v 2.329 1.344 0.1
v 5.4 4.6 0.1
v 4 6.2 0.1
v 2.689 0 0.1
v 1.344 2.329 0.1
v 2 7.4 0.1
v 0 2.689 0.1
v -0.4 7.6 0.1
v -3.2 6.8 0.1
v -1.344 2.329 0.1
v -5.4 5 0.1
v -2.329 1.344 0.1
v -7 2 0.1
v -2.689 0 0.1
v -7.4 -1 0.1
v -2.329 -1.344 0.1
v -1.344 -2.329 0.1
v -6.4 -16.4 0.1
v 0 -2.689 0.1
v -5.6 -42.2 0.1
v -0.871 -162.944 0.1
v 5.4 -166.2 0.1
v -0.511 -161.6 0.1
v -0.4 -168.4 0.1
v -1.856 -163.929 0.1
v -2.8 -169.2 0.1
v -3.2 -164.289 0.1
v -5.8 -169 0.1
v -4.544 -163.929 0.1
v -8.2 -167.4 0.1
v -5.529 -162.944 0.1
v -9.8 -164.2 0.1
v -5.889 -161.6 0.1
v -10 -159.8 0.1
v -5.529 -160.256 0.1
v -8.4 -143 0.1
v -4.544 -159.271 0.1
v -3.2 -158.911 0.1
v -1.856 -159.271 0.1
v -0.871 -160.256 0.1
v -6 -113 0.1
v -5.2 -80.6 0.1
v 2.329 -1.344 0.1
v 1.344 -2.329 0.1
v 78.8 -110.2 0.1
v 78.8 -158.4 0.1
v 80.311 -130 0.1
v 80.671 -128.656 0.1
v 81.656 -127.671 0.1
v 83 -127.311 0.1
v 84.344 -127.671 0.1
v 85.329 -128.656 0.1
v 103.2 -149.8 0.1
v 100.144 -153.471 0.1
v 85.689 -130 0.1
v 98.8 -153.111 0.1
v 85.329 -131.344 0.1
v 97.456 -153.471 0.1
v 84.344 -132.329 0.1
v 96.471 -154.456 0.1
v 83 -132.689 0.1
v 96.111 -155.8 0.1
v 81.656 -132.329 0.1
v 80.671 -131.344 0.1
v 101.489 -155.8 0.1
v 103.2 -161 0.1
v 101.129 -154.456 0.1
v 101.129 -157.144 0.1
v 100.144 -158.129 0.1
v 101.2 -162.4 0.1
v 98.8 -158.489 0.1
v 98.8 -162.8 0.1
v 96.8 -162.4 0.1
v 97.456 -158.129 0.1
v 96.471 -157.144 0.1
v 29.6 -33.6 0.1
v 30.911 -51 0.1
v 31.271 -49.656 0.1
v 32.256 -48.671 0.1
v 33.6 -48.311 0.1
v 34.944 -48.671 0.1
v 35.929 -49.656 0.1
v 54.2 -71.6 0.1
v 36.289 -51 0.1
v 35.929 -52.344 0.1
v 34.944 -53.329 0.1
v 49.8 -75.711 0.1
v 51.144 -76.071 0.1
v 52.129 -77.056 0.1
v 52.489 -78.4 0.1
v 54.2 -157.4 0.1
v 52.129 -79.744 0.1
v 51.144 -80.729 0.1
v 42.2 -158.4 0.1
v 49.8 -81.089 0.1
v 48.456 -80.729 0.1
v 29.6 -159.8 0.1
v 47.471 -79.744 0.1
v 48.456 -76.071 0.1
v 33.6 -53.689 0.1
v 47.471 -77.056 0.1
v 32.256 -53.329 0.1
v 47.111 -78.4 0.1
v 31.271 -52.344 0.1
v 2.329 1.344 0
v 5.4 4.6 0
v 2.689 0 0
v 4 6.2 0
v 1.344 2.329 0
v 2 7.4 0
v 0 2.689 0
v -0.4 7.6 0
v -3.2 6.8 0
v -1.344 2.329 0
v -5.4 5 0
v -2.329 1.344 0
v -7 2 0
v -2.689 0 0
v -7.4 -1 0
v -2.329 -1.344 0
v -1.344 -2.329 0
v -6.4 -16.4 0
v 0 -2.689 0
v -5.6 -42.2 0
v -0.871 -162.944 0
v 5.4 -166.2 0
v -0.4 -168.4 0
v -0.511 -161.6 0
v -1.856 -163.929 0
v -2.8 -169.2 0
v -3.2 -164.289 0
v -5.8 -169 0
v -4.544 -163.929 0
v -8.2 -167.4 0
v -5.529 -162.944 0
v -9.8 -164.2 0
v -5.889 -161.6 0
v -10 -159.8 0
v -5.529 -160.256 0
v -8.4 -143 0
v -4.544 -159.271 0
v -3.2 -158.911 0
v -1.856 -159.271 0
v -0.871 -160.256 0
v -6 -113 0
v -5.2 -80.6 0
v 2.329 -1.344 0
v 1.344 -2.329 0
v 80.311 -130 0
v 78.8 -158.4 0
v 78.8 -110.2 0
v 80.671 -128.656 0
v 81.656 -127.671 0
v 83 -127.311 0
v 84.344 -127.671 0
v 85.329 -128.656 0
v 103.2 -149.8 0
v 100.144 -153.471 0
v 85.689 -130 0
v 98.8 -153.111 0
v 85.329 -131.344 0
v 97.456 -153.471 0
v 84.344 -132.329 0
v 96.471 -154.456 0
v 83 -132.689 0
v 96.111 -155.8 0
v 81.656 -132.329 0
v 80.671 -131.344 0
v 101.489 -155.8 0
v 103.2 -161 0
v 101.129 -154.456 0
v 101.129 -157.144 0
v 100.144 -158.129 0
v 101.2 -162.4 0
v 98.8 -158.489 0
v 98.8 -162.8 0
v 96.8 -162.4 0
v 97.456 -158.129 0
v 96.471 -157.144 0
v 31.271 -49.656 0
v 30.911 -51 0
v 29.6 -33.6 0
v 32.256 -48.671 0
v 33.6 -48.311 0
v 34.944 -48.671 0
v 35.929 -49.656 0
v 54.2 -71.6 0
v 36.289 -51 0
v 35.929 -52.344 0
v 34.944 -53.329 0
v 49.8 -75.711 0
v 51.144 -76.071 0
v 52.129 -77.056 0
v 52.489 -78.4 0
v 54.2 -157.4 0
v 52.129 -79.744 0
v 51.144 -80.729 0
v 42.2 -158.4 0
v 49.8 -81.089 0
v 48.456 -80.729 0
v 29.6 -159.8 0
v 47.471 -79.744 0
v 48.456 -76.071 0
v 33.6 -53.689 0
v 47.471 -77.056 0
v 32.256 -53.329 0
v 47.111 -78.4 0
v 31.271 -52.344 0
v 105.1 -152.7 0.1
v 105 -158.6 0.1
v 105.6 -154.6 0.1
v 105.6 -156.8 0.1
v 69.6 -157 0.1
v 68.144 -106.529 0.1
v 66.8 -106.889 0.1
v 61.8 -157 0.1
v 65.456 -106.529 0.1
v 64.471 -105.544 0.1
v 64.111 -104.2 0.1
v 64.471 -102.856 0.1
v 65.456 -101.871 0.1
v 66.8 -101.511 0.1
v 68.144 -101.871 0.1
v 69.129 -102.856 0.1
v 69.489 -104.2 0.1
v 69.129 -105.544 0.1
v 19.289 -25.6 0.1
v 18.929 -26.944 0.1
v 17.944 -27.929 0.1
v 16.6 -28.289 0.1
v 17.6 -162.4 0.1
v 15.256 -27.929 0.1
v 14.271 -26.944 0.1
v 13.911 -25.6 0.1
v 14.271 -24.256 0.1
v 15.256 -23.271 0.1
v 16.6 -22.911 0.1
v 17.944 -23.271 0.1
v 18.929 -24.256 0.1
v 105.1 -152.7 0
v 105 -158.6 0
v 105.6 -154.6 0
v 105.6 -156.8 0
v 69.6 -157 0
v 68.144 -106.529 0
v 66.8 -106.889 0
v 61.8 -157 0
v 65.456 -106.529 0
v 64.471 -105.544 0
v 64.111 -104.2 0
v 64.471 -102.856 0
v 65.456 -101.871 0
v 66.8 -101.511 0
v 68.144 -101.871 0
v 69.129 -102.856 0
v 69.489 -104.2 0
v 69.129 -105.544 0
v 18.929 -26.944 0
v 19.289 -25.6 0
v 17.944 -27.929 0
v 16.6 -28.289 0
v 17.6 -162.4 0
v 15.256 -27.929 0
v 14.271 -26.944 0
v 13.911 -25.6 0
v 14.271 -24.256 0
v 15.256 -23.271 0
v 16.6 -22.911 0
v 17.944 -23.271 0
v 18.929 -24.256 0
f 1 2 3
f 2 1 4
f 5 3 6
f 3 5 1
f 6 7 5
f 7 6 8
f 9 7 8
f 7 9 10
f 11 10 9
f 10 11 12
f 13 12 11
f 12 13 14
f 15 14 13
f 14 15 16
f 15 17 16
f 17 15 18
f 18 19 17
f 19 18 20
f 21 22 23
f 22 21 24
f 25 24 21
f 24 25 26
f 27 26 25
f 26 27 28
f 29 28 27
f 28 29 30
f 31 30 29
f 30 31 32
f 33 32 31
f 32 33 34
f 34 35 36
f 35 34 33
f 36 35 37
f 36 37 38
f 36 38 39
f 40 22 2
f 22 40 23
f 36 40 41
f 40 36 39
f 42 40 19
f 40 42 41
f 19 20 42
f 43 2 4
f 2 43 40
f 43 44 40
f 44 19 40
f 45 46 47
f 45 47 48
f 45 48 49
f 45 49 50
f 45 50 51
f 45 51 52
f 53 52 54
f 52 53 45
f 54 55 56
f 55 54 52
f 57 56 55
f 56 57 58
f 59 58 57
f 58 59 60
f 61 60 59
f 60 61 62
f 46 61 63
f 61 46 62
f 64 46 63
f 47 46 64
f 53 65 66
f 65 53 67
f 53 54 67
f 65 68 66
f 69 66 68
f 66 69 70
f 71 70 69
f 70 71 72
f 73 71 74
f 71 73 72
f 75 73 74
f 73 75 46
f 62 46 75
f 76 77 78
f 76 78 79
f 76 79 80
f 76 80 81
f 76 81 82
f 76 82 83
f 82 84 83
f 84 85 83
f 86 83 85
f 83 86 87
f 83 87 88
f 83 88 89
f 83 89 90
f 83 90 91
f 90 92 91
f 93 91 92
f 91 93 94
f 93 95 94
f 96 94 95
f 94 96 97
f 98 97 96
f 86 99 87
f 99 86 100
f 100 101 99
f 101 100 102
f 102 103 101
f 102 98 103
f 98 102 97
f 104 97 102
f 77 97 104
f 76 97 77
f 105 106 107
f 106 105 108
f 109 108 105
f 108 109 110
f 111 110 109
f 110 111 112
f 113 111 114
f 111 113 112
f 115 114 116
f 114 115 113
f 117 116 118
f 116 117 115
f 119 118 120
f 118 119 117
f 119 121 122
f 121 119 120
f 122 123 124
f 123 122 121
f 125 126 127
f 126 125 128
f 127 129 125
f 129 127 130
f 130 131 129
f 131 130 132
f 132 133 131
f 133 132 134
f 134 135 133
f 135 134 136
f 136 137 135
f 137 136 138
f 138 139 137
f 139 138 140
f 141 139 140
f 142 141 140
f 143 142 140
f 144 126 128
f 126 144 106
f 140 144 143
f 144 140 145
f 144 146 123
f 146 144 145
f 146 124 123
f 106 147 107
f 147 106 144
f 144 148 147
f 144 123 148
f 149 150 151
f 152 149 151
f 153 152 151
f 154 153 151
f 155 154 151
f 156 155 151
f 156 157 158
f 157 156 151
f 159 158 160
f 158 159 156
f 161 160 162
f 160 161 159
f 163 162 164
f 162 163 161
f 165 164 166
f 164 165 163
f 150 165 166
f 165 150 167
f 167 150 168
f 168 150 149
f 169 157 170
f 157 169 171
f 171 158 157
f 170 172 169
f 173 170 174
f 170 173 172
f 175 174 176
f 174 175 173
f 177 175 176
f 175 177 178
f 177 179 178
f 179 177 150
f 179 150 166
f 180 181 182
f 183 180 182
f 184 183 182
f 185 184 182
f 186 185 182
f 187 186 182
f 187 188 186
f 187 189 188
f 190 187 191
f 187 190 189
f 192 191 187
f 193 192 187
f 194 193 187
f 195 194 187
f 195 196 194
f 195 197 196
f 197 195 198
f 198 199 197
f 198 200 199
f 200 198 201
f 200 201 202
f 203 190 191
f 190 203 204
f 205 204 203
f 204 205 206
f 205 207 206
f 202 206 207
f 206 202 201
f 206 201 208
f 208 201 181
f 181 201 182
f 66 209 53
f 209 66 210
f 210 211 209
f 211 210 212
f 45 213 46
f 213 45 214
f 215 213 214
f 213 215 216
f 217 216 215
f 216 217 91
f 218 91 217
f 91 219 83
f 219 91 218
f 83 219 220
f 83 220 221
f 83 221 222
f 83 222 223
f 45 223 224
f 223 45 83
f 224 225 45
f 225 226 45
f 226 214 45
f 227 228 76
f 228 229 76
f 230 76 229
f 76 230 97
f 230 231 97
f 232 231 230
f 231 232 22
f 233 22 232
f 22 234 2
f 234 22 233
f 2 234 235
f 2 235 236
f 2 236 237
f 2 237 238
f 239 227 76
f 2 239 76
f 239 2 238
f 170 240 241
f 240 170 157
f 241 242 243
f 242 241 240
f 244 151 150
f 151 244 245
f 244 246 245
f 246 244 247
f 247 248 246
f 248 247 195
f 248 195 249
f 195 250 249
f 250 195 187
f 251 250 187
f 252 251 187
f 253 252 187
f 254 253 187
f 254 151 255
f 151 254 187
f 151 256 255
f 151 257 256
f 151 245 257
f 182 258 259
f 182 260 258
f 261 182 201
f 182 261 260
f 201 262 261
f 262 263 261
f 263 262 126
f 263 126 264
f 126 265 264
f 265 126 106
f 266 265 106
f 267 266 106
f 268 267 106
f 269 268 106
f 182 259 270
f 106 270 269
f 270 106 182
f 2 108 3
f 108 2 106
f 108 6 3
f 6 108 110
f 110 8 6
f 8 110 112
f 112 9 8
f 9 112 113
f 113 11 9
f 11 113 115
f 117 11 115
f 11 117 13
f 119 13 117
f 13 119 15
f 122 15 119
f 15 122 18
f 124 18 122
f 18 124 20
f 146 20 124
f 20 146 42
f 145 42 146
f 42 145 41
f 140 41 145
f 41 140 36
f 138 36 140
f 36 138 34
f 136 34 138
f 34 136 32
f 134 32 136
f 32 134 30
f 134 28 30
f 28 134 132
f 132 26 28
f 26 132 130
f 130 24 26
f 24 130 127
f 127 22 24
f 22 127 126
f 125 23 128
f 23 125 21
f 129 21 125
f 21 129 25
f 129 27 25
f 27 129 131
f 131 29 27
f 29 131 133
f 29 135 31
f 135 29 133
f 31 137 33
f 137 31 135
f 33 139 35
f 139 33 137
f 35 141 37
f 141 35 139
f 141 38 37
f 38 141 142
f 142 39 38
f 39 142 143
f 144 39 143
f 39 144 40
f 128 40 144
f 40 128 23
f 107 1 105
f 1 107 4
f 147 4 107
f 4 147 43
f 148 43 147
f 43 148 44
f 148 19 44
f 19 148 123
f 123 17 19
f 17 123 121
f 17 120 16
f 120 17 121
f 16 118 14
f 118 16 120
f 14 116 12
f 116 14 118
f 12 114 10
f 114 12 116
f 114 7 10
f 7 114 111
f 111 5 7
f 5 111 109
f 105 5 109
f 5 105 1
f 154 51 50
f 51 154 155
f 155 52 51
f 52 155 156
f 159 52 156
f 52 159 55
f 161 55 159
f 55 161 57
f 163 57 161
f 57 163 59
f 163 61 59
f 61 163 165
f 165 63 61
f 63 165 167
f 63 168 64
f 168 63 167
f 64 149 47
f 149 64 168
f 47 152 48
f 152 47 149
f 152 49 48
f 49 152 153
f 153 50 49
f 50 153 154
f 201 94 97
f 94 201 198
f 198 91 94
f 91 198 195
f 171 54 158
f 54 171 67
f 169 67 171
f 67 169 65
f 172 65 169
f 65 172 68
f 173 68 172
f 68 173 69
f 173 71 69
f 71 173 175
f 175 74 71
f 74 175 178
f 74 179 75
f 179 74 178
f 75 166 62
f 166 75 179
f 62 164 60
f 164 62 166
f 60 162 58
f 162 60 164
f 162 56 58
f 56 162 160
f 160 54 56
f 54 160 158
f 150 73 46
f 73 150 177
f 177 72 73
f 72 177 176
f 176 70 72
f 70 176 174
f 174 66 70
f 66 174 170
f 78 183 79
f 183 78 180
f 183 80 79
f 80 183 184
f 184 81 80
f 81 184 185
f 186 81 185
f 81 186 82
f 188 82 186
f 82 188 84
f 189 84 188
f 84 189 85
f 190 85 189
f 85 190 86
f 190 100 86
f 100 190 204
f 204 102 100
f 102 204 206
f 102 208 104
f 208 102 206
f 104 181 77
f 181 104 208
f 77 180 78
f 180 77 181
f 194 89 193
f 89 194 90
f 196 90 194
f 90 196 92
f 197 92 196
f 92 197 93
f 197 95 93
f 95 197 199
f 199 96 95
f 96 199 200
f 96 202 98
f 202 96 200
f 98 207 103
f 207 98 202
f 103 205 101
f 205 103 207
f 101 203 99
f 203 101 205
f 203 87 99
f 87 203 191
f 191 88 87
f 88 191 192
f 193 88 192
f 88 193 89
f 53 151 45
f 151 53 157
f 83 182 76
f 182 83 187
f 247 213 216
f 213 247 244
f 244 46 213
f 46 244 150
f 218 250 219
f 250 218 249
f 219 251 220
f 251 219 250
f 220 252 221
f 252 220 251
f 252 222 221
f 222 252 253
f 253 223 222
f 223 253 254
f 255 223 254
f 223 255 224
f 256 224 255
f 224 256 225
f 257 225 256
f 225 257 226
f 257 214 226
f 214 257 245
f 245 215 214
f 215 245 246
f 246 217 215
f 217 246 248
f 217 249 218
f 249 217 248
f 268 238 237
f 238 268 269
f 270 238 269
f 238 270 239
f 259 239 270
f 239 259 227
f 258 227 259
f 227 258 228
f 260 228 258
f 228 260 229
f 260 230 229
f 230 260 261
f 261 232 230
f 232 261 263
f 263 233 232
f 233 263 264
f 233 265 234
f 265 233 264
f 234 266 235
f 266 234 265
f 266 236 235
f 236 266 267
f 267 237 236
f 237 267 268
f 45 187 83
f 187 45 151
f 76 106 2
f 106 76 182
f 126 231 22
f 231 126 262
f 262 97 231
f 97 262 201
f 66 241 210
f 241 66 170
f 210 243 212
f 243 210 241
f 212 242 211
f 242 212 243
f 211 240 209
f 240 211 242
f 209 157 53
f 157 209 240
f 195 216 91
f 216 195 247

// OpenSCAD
use <../lib.scad>
use <s/u9496s01.scad>
use <s/u9496s02.scad>
use <s/u9496s03.scad>
use <s/u9496s04.scad>
function ldraw_lib__u9496() = [
// 0 Sheet Fabric 15 x 22 Triangular Sail
// 0 Name: u9496.dat
// 0 Author: Philippe Hurbain [Philo]
// 0 !LDRAW_ORG Part UPDATE 2022-03
// 0 !LICENSE Licensed under CC BY 2.0 and CC BY 4.0 : see CAreadme.txt
// 
// 0 BFC CERTIFY CCW
  [0,"BFC","CERTIFY"],
  [0,"BFC","CCW"],
// 
// 0 !CATEGORY Sheet Fabric
// 
// 0 !HISTORY 2022-05-07 [PTadmin] Official Update 2022-03
// 
// 
// 1 16 0 -0.25 0 1 0 0 0 1 0 0 0 1 s\u9496s01.dat
  [1,16,0,-0.25,0,1,0,0,0,1,0,0,0,1, ldraw_lib__s__u9496s01()],
// 1 16 0 0 0 1 0 0 0 -1 0 0 0 1 s\u9496s01.dat
  [1,16,0,0,0,1,0,0,0,-1,0,0,0,1, ldraw_lib__s__u9496s01()],
// 
// 1 16 0 -0.25 0 1 0 0 0 1 0 0 0 1 s\u9496s02.dat
  [1,16,0,-0.25,0,1,0,0,0,1,0,0,0,1, ldraw_lib__s__u9496s02()],
// 1 16 0 0 0 1 0 0 0 -1 0 0 0 1 s\u9496s02.dat
  [1,16,0,0,0,1,0,0,0,-1,0,0,0,1, ldraw_lib__s__u9496s02()],
// 
// 1 16 0 0 0 1 0 0 0 1 0 0 0 1 s\u9496s03.dat
  [1,16,0,0,0,1,0,0,0,1,0,0,0,1, ldraw_lib__s__u9496s03()],
// 
// 1 16 0 0 0 1 0 0 0 1 0 0 0 1 s\u9496s04.dat
  [1,16,0,0,0,1,0,0,0,1,0,0,0,1, ldraw_lib__s__u9496s04()],
];
makepoly(ldraw_lib__u9496(), line=0.2);
